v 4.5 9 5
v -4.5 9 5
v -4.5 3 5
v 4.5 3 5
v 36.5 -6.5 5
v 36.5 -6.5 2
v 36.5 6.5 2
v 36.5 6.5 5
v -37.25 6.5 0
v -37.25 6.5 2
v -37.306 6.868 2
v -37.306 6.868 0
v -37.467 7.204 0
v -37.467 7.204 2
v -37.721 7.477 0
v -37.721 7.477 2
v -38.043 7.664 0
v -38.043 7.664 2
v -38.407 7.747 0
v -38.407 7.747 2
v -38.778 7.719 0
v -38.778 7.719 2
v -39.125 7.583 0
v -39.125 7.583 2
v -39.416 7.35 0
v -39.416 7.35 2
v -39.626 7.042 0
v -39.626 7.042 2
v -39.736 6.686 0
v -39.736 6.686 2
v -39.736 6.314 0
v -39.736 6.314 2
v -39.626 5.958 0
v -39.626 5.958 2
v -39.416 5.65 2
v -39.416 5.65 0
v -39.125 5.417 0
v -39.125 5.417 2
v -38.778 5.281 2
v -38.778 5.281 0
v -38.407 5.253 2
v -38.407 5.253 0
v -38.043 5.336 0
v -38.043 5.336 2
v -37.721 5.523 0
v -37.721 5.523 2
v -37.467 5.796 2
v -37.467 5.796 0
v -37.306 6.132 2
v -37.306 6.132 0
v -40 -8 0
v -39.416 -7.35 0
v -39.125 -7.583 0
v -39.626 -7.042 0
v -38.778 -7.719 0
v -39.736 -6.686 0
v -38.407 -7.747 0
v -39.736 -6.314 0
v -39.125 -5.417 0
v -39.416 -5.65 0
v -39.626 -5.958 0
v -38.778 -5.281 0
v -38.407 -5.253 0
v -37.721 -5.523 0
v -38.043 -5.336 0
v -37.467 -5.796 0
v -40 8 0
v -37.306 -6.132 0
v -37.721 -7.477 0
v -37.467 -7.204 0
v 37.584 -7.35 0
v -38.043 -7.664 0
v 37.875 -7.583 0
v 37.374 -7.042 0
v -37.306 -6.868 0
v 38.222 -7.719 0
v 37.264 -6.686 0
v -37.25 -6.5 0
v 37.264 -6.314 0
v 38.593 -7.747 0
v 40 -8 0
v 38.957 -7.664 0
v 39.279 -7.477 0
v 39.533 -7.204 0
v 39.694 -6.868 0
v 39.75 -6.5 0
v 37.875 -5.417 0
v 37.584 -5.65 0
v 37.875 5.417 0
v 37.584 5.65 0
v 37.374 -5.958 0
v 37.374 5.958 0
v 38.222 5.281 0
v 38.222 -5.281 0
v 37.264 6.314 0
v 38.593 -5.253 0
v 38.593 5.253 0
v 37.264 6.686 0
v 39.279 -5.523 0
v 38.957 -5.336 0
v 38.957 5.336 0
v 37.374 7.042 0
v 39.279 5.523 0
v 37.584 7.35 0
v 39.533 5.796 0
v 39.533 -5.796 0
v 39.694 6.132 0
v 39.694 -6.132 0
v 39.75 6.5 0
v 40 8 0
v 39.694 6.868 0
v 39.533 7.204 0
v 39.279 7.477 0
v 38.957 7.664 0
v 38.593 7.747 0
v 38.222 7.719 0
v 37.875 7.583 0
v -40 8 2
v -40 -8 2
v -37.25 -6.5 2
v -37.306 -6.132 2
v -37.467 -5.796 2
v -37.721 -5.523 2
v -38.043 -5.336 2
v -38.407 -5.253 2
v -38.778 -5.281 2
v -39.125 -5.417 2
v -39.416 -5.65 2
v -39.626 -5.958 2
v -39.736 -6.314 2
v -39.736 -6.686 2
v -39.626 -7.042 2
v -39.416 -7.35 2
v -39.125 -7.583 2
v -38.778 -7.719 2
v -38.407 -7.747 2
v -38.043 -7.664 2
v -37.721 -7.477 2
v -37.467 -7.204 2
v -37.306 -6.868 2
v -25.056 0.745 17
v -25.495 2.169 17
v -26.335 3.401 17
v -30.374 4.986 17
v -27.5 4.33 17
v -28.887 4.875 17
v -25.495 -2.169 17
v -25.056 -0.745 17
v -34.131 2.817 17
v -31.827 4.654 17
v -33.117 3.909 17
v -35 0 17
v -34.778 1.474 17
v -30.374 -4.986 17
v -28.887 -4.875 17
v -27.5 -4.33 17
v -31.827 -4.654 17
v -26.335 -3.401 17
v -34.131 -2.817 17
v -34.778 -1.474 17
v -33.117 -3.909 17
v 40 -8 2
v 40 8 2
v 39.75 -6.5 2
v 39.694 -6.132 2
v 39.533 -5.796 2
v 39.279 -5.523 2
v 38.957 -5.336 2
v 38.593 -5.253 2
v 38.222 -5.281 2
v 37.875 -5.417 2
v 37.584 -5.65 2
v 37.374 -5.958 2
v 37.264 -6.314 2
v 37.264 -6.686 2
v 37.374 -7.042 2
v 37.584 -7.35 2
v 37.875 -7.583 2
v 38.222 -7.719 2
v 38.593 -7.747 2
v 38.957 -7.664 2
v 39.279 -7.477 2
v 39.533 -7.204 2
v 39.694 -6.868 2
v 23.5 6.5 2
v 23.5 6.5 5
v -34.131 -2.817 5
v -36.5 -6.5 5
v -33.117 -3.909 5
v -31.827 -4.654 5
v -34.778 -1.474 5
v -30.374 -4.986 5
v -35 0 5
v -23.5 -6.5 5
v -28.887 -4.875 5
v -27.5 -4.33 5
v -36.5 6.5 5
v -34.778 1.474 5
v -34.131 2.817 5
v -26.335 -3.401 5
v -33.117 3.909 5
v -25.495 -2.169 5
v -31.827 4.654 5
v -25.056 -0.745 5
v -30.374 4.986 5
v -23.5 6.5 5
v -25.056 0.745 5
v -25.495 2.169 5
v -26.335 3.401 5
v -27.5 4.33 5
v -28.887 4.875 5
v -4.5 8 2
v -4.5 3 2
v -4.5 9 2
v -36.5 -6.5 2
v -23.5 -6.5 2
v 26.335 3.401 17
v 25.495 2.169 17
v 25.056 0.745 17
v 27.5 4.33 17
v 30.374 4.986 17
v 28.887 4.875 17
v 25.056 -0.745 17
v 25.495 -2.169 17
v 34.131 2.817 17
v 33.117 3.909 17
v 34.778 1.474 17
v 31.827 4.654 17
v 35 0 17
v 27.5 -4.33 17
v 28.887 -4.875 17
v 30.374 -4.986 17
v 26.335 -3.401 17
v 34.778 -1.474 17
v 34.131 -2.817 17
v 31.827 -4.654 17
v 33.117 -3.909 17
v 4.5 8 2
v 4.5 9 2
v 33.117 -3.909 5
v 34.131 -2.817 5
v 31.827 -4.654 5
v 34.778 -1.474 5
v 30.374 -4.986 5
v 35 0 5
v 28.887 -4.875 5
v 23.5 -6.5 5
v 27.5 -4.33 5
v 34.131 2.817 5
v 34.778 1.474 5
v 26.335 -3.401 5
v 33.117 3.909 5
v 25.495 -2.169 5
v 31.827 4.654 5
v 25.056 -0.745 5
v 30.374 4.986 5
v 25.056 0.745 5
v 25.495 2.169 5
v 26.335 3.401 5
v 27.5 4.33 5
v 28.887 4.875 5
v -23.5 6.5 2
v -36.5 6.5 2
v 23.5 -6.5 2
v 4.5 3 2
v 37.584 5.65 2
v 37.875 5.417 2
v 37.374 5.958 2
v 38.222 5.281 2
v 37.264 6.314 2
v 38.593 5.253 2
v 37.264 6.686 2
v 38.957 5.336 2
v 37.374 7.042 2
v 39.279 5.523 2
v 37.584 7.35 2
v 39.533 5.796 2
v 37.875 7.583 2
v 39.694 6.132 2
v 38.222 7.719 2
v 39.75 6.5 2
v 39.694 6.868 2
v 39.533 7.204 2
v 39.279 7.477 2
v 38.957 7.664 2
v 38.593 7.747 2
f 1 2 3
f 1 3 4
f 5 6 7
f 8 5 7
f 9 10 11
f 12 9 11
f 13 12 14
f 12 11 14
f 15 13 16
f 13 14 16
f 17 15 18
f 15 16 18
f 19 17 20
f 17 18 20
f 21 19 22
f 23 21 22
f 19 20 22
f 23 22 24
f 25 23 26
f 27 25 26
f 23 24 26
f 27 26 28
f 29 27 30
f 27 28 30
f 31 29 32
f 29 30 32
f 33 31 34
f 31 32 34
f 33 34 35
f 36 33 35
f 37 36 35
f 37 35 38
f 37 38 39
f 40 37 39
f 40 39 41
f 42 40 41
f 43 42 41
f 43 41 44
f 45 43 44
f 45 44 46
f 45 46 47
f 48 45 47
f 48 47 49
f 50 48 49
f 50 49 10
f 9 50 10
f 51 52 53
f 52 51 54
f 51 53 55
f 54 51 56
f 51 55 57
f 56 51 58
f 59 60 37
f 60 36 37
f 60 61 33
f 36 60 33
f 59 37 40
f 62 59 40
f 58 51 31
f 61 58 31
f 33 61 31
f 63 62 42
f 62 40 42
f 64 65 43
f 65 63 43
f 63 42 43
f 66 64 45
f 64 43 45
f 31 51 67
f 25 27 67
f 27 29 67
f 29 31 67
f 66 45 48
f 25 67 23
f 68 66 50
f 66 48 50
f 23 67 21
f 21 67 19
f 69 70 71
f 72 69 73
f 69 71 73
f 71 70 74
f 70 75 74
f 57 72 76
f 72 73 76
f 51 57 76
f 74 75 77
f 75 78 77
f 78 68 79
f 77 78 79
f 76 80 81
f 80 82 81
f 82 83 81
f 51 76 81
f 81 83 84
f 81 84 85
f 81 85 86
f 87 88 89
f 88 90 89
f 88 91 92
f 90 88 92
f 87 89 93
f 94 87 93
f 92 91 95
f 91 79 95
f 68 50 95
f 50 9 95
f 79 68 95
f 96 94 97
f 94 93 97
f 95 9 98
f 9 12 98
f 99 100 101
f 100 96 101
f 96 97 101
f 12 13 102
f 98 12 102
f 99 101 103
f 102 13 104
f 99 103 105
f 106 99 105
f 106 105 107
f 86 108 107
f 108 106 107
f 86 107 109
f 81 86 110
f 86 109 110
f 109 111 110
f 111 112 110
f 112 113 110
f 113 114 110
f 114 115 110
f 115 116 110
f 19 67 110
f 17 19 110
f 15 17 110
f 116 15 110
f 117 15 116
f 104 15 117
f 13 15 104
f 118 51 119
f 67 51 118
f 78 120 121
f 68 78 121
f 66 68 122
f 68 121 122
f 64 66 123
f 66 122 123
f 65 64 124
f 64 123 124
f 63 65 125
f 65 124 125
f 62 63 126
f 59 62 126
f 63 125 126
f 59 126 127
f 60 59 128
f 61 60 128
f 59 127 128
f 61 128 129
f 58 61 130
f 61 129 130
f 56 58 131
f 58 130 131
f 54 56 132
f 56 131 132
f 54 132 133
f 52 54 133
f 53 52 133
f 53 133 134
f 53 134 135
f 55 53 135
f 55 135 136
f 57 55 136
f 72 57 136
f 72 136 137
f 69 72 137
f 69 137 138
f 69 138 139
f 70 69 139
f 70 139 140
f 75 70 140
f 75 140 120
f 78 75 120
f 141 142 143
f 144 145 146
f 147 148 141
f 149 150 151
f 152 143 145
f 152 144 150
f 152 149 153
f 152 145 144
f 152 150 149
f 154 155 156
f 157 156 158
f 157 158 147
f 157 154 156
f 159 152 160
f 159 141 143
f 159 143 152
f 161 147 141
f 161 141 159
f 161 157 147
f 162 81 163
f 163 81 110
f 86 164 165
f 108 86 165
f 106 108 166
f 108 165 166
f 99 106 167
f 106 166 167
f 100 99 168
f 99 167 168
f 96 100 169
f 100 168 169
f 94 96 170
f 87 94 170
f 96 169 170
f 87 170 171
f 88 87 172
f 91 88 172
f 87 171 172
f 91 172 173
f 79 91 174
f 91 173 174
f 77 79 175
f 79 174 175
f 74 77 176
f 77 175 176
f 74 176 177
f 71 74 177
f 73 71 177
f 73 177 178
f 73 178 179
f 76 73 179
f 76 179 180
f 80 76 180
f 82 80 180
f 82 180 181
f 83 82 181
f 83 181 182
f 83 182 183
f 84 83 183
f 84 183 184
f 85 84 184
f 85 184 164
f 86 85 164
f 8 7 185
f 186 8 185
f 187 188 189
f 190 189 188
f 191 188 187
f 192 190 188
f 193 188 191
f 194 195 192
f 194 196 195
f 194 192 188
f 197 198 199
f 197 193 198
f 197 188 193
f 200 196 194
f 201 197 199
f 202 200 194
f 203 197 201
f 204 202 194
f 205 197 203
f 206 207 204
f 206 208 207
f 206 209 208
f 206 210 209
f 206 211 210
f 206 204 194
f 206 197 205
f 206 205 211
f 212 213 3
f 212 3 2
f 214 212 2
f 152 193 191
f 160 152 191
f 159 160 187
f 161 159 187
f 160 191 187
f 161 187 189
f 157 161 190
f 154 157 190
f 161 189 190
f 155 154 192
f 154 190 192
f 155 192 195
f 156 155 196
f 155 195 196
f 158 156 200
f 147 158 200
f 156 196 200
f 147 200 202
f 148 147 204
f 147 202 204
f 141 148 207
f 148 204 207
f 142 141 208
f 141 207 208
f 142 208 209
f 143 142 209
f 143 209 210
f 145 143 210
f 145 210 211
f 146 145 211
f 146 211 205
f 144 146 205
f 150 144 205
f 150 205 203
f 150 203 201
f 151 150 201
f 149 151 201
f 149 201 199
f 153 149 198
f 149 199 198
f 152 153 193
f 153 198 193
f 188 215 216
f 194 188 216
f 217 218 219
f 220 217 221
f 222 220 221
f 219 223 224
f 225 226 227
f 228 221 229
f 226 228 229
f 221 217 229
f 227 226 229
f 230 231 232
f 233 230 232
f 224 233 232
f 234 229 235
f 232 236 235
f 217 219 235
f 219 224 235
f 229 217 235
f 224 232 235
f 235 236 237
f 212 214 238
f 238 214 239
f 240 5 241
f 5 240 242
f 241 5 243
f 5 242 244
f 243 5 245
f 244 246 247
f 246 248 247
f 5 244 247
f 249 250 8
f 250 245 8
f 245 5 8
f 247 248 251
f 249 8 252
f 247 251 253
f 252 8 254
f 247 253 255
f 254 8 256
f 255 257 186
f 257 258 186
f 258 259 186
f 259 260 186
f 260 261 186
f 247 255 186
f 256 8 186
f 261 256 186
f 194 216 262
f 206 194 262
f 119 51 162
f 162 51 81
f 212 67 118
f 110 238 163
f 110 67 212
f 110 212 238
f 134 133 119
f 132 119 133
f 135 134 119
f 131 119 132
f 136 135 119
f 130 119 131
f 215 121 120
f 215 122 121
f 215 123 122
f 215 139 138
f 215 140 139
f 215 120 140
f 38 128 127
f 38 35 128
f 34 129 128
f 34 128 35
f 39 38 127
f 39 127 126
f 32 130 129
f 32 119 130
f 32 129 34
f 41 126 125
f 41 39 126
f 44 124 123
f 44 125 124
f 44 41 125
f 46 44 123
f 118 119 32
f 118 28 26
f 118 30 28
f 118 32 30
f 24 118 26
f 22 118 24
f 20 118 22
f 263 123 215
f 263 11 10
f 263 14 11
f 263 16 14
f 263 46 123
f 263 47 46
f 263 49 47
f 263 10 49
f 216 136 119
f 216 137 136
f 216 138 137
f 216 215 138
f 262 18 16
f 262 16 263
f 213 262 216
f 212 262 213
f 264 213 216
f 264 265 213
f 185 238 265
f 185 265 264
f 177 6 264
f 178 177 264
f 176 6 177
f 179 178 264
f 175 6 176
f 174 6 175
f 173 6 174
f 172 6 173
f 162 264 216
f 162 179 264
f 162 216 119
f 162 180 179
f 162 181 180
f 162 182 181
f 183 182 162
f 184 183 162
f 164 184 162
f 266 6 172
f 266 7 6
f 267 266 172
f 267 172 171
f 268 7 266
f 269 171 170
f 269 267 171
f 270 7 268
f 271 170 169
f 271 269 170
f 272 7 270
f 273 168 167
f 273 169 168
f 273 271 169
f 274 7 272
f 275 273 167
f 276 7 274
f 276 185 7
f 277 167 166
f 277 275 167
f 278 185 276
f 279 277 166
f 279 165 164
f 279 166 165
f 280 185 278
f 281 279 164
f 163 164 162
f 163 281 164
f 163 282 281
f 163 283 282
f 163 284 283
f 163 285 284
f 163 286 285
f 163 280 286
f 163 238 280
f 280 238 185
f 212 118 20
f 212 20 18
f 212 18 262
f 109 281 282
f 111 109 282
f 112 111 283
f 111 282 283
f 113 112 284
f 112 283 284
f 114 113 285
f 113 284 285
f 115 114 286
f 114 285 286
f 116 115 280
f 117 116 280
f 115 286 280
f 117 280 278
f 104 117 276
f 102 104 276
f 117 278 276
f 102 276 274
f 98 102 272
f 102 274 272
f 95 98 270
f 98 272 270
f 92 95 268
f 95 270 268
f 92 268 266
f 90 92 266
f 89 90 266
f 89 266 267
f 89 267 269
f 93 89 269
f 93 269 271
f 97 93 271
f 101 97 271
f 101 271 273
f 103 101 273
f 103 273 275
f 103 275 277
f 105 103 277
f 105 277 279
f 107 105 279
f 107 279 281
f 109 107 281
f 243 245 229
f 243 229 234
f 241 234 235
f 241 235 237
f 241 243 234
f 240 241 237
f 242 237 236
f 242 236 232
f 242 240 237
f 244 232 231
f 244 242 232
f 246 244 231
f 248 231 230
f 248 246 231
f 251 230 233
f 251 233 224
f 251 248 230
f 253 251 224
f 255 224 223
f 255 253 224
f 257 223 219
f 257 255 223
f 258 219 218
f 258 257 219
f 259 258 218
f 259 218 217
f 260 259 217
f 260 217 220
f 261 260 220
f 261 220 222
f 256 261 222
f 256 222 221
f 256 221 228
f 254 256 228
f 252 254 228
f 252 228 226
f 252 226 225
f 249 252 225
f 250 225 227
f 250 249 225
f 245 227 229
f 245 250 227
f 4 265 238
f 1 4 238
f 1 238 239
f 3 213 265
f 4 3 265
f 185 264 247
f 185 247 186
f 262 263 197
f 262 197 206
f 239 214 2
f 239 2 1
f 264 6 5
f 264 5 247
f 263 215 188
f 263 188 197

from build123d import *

# Parameters (mm, degrees)
SKETCH_1_W            = 80
SKETCH_1_H            = 16
EXTRUDE_404_DEPTH     = 2
SKETCH_5_R            = 1.25
CUT_EXTRUDE_623_DEPTH = 41.841155713
SKETCH_3_W            = 13
SKETCH_3_H            = 13
EXTRUDE_867_DEPTH     = 3
SKETCH_4_R            = 5
EXTRUDE_1060_DEPTH    = 12
SKETCH_2_W            = 9
SKETCH_2_H            = 6
MICROUSB_DEPTH        = 3


with BuildPart() as part:
    # Эскиз1 → Extrude 404 (new body)
    with BuildSketch(Plane.XY):
        Rectangle(SKETCH_1_W, SKETCH_1_H)
    extrude(amount=EXTRUDE_404_DEPTH)

    # Эскиз5 → Cut-Extrude 623 (cut, through all)
    with BuildSketch(Plane.XY.offset(2)):
        with Locations((-38.5, 6.5)):
            Circle(SKETCH_5_R)
        with Locations((38.5, 6.5)):
            Circle(SKETCH_5_R)
        with Locations((38.5, -6.5)):
            Circle(SKETCH_5_R)
        with Locations((-38.5, -6.5)):
            Circle(SKETCH_5_R)
    extrude(amount=-CUT_EXTRUDE_623_DEPTH, mode=Mode.SUBTRACT)

    # Эскиз3 → Extrude 867 (add)
    with BuildSketch(Plane.XY.offset(2)):
        with Locations((-30, 0)):
            Rectangle(SKETCH_3_W, SKETCH_3_H)
    extrude_867 = extrude(amount=EXTRUDE_867_DEPTH)

    # Эскиз4 → Extrude 1060 (add)
    with BuildSketch(Plane.XY.offset(5)):
        with Locations(Location((-30, 0, 0), (0, 0, 180))):
            Circle(SKETCH_4_R)
    extrude_1060 = extrude(amount=EXTRUDE_1060_DEPTH)

    # Зеркальное отражение1: Extrude 867, Extrude 1060 across plane
    add(extrude_867.mirror(Plane(origin=(0, 0, 0), x_dir=(0, 0, 1), z_dir=(1, 0, 0))))
    add(extrude_1060.mirror(Plane(origin=(0, 0, 0), x_dir=(0, 0, 1), z_dir=(1, 0, 0))))

    # Эскиз2 → microusb (add)
    with BuildSketch(Plane.XY.offset(2)):
        with Locations((0, 6)):
            Rectangle(SKETCH_2_W, SKETCH_2_H)
    extrude(amount=MICROUSB_DEPTH)


solid = part.part
